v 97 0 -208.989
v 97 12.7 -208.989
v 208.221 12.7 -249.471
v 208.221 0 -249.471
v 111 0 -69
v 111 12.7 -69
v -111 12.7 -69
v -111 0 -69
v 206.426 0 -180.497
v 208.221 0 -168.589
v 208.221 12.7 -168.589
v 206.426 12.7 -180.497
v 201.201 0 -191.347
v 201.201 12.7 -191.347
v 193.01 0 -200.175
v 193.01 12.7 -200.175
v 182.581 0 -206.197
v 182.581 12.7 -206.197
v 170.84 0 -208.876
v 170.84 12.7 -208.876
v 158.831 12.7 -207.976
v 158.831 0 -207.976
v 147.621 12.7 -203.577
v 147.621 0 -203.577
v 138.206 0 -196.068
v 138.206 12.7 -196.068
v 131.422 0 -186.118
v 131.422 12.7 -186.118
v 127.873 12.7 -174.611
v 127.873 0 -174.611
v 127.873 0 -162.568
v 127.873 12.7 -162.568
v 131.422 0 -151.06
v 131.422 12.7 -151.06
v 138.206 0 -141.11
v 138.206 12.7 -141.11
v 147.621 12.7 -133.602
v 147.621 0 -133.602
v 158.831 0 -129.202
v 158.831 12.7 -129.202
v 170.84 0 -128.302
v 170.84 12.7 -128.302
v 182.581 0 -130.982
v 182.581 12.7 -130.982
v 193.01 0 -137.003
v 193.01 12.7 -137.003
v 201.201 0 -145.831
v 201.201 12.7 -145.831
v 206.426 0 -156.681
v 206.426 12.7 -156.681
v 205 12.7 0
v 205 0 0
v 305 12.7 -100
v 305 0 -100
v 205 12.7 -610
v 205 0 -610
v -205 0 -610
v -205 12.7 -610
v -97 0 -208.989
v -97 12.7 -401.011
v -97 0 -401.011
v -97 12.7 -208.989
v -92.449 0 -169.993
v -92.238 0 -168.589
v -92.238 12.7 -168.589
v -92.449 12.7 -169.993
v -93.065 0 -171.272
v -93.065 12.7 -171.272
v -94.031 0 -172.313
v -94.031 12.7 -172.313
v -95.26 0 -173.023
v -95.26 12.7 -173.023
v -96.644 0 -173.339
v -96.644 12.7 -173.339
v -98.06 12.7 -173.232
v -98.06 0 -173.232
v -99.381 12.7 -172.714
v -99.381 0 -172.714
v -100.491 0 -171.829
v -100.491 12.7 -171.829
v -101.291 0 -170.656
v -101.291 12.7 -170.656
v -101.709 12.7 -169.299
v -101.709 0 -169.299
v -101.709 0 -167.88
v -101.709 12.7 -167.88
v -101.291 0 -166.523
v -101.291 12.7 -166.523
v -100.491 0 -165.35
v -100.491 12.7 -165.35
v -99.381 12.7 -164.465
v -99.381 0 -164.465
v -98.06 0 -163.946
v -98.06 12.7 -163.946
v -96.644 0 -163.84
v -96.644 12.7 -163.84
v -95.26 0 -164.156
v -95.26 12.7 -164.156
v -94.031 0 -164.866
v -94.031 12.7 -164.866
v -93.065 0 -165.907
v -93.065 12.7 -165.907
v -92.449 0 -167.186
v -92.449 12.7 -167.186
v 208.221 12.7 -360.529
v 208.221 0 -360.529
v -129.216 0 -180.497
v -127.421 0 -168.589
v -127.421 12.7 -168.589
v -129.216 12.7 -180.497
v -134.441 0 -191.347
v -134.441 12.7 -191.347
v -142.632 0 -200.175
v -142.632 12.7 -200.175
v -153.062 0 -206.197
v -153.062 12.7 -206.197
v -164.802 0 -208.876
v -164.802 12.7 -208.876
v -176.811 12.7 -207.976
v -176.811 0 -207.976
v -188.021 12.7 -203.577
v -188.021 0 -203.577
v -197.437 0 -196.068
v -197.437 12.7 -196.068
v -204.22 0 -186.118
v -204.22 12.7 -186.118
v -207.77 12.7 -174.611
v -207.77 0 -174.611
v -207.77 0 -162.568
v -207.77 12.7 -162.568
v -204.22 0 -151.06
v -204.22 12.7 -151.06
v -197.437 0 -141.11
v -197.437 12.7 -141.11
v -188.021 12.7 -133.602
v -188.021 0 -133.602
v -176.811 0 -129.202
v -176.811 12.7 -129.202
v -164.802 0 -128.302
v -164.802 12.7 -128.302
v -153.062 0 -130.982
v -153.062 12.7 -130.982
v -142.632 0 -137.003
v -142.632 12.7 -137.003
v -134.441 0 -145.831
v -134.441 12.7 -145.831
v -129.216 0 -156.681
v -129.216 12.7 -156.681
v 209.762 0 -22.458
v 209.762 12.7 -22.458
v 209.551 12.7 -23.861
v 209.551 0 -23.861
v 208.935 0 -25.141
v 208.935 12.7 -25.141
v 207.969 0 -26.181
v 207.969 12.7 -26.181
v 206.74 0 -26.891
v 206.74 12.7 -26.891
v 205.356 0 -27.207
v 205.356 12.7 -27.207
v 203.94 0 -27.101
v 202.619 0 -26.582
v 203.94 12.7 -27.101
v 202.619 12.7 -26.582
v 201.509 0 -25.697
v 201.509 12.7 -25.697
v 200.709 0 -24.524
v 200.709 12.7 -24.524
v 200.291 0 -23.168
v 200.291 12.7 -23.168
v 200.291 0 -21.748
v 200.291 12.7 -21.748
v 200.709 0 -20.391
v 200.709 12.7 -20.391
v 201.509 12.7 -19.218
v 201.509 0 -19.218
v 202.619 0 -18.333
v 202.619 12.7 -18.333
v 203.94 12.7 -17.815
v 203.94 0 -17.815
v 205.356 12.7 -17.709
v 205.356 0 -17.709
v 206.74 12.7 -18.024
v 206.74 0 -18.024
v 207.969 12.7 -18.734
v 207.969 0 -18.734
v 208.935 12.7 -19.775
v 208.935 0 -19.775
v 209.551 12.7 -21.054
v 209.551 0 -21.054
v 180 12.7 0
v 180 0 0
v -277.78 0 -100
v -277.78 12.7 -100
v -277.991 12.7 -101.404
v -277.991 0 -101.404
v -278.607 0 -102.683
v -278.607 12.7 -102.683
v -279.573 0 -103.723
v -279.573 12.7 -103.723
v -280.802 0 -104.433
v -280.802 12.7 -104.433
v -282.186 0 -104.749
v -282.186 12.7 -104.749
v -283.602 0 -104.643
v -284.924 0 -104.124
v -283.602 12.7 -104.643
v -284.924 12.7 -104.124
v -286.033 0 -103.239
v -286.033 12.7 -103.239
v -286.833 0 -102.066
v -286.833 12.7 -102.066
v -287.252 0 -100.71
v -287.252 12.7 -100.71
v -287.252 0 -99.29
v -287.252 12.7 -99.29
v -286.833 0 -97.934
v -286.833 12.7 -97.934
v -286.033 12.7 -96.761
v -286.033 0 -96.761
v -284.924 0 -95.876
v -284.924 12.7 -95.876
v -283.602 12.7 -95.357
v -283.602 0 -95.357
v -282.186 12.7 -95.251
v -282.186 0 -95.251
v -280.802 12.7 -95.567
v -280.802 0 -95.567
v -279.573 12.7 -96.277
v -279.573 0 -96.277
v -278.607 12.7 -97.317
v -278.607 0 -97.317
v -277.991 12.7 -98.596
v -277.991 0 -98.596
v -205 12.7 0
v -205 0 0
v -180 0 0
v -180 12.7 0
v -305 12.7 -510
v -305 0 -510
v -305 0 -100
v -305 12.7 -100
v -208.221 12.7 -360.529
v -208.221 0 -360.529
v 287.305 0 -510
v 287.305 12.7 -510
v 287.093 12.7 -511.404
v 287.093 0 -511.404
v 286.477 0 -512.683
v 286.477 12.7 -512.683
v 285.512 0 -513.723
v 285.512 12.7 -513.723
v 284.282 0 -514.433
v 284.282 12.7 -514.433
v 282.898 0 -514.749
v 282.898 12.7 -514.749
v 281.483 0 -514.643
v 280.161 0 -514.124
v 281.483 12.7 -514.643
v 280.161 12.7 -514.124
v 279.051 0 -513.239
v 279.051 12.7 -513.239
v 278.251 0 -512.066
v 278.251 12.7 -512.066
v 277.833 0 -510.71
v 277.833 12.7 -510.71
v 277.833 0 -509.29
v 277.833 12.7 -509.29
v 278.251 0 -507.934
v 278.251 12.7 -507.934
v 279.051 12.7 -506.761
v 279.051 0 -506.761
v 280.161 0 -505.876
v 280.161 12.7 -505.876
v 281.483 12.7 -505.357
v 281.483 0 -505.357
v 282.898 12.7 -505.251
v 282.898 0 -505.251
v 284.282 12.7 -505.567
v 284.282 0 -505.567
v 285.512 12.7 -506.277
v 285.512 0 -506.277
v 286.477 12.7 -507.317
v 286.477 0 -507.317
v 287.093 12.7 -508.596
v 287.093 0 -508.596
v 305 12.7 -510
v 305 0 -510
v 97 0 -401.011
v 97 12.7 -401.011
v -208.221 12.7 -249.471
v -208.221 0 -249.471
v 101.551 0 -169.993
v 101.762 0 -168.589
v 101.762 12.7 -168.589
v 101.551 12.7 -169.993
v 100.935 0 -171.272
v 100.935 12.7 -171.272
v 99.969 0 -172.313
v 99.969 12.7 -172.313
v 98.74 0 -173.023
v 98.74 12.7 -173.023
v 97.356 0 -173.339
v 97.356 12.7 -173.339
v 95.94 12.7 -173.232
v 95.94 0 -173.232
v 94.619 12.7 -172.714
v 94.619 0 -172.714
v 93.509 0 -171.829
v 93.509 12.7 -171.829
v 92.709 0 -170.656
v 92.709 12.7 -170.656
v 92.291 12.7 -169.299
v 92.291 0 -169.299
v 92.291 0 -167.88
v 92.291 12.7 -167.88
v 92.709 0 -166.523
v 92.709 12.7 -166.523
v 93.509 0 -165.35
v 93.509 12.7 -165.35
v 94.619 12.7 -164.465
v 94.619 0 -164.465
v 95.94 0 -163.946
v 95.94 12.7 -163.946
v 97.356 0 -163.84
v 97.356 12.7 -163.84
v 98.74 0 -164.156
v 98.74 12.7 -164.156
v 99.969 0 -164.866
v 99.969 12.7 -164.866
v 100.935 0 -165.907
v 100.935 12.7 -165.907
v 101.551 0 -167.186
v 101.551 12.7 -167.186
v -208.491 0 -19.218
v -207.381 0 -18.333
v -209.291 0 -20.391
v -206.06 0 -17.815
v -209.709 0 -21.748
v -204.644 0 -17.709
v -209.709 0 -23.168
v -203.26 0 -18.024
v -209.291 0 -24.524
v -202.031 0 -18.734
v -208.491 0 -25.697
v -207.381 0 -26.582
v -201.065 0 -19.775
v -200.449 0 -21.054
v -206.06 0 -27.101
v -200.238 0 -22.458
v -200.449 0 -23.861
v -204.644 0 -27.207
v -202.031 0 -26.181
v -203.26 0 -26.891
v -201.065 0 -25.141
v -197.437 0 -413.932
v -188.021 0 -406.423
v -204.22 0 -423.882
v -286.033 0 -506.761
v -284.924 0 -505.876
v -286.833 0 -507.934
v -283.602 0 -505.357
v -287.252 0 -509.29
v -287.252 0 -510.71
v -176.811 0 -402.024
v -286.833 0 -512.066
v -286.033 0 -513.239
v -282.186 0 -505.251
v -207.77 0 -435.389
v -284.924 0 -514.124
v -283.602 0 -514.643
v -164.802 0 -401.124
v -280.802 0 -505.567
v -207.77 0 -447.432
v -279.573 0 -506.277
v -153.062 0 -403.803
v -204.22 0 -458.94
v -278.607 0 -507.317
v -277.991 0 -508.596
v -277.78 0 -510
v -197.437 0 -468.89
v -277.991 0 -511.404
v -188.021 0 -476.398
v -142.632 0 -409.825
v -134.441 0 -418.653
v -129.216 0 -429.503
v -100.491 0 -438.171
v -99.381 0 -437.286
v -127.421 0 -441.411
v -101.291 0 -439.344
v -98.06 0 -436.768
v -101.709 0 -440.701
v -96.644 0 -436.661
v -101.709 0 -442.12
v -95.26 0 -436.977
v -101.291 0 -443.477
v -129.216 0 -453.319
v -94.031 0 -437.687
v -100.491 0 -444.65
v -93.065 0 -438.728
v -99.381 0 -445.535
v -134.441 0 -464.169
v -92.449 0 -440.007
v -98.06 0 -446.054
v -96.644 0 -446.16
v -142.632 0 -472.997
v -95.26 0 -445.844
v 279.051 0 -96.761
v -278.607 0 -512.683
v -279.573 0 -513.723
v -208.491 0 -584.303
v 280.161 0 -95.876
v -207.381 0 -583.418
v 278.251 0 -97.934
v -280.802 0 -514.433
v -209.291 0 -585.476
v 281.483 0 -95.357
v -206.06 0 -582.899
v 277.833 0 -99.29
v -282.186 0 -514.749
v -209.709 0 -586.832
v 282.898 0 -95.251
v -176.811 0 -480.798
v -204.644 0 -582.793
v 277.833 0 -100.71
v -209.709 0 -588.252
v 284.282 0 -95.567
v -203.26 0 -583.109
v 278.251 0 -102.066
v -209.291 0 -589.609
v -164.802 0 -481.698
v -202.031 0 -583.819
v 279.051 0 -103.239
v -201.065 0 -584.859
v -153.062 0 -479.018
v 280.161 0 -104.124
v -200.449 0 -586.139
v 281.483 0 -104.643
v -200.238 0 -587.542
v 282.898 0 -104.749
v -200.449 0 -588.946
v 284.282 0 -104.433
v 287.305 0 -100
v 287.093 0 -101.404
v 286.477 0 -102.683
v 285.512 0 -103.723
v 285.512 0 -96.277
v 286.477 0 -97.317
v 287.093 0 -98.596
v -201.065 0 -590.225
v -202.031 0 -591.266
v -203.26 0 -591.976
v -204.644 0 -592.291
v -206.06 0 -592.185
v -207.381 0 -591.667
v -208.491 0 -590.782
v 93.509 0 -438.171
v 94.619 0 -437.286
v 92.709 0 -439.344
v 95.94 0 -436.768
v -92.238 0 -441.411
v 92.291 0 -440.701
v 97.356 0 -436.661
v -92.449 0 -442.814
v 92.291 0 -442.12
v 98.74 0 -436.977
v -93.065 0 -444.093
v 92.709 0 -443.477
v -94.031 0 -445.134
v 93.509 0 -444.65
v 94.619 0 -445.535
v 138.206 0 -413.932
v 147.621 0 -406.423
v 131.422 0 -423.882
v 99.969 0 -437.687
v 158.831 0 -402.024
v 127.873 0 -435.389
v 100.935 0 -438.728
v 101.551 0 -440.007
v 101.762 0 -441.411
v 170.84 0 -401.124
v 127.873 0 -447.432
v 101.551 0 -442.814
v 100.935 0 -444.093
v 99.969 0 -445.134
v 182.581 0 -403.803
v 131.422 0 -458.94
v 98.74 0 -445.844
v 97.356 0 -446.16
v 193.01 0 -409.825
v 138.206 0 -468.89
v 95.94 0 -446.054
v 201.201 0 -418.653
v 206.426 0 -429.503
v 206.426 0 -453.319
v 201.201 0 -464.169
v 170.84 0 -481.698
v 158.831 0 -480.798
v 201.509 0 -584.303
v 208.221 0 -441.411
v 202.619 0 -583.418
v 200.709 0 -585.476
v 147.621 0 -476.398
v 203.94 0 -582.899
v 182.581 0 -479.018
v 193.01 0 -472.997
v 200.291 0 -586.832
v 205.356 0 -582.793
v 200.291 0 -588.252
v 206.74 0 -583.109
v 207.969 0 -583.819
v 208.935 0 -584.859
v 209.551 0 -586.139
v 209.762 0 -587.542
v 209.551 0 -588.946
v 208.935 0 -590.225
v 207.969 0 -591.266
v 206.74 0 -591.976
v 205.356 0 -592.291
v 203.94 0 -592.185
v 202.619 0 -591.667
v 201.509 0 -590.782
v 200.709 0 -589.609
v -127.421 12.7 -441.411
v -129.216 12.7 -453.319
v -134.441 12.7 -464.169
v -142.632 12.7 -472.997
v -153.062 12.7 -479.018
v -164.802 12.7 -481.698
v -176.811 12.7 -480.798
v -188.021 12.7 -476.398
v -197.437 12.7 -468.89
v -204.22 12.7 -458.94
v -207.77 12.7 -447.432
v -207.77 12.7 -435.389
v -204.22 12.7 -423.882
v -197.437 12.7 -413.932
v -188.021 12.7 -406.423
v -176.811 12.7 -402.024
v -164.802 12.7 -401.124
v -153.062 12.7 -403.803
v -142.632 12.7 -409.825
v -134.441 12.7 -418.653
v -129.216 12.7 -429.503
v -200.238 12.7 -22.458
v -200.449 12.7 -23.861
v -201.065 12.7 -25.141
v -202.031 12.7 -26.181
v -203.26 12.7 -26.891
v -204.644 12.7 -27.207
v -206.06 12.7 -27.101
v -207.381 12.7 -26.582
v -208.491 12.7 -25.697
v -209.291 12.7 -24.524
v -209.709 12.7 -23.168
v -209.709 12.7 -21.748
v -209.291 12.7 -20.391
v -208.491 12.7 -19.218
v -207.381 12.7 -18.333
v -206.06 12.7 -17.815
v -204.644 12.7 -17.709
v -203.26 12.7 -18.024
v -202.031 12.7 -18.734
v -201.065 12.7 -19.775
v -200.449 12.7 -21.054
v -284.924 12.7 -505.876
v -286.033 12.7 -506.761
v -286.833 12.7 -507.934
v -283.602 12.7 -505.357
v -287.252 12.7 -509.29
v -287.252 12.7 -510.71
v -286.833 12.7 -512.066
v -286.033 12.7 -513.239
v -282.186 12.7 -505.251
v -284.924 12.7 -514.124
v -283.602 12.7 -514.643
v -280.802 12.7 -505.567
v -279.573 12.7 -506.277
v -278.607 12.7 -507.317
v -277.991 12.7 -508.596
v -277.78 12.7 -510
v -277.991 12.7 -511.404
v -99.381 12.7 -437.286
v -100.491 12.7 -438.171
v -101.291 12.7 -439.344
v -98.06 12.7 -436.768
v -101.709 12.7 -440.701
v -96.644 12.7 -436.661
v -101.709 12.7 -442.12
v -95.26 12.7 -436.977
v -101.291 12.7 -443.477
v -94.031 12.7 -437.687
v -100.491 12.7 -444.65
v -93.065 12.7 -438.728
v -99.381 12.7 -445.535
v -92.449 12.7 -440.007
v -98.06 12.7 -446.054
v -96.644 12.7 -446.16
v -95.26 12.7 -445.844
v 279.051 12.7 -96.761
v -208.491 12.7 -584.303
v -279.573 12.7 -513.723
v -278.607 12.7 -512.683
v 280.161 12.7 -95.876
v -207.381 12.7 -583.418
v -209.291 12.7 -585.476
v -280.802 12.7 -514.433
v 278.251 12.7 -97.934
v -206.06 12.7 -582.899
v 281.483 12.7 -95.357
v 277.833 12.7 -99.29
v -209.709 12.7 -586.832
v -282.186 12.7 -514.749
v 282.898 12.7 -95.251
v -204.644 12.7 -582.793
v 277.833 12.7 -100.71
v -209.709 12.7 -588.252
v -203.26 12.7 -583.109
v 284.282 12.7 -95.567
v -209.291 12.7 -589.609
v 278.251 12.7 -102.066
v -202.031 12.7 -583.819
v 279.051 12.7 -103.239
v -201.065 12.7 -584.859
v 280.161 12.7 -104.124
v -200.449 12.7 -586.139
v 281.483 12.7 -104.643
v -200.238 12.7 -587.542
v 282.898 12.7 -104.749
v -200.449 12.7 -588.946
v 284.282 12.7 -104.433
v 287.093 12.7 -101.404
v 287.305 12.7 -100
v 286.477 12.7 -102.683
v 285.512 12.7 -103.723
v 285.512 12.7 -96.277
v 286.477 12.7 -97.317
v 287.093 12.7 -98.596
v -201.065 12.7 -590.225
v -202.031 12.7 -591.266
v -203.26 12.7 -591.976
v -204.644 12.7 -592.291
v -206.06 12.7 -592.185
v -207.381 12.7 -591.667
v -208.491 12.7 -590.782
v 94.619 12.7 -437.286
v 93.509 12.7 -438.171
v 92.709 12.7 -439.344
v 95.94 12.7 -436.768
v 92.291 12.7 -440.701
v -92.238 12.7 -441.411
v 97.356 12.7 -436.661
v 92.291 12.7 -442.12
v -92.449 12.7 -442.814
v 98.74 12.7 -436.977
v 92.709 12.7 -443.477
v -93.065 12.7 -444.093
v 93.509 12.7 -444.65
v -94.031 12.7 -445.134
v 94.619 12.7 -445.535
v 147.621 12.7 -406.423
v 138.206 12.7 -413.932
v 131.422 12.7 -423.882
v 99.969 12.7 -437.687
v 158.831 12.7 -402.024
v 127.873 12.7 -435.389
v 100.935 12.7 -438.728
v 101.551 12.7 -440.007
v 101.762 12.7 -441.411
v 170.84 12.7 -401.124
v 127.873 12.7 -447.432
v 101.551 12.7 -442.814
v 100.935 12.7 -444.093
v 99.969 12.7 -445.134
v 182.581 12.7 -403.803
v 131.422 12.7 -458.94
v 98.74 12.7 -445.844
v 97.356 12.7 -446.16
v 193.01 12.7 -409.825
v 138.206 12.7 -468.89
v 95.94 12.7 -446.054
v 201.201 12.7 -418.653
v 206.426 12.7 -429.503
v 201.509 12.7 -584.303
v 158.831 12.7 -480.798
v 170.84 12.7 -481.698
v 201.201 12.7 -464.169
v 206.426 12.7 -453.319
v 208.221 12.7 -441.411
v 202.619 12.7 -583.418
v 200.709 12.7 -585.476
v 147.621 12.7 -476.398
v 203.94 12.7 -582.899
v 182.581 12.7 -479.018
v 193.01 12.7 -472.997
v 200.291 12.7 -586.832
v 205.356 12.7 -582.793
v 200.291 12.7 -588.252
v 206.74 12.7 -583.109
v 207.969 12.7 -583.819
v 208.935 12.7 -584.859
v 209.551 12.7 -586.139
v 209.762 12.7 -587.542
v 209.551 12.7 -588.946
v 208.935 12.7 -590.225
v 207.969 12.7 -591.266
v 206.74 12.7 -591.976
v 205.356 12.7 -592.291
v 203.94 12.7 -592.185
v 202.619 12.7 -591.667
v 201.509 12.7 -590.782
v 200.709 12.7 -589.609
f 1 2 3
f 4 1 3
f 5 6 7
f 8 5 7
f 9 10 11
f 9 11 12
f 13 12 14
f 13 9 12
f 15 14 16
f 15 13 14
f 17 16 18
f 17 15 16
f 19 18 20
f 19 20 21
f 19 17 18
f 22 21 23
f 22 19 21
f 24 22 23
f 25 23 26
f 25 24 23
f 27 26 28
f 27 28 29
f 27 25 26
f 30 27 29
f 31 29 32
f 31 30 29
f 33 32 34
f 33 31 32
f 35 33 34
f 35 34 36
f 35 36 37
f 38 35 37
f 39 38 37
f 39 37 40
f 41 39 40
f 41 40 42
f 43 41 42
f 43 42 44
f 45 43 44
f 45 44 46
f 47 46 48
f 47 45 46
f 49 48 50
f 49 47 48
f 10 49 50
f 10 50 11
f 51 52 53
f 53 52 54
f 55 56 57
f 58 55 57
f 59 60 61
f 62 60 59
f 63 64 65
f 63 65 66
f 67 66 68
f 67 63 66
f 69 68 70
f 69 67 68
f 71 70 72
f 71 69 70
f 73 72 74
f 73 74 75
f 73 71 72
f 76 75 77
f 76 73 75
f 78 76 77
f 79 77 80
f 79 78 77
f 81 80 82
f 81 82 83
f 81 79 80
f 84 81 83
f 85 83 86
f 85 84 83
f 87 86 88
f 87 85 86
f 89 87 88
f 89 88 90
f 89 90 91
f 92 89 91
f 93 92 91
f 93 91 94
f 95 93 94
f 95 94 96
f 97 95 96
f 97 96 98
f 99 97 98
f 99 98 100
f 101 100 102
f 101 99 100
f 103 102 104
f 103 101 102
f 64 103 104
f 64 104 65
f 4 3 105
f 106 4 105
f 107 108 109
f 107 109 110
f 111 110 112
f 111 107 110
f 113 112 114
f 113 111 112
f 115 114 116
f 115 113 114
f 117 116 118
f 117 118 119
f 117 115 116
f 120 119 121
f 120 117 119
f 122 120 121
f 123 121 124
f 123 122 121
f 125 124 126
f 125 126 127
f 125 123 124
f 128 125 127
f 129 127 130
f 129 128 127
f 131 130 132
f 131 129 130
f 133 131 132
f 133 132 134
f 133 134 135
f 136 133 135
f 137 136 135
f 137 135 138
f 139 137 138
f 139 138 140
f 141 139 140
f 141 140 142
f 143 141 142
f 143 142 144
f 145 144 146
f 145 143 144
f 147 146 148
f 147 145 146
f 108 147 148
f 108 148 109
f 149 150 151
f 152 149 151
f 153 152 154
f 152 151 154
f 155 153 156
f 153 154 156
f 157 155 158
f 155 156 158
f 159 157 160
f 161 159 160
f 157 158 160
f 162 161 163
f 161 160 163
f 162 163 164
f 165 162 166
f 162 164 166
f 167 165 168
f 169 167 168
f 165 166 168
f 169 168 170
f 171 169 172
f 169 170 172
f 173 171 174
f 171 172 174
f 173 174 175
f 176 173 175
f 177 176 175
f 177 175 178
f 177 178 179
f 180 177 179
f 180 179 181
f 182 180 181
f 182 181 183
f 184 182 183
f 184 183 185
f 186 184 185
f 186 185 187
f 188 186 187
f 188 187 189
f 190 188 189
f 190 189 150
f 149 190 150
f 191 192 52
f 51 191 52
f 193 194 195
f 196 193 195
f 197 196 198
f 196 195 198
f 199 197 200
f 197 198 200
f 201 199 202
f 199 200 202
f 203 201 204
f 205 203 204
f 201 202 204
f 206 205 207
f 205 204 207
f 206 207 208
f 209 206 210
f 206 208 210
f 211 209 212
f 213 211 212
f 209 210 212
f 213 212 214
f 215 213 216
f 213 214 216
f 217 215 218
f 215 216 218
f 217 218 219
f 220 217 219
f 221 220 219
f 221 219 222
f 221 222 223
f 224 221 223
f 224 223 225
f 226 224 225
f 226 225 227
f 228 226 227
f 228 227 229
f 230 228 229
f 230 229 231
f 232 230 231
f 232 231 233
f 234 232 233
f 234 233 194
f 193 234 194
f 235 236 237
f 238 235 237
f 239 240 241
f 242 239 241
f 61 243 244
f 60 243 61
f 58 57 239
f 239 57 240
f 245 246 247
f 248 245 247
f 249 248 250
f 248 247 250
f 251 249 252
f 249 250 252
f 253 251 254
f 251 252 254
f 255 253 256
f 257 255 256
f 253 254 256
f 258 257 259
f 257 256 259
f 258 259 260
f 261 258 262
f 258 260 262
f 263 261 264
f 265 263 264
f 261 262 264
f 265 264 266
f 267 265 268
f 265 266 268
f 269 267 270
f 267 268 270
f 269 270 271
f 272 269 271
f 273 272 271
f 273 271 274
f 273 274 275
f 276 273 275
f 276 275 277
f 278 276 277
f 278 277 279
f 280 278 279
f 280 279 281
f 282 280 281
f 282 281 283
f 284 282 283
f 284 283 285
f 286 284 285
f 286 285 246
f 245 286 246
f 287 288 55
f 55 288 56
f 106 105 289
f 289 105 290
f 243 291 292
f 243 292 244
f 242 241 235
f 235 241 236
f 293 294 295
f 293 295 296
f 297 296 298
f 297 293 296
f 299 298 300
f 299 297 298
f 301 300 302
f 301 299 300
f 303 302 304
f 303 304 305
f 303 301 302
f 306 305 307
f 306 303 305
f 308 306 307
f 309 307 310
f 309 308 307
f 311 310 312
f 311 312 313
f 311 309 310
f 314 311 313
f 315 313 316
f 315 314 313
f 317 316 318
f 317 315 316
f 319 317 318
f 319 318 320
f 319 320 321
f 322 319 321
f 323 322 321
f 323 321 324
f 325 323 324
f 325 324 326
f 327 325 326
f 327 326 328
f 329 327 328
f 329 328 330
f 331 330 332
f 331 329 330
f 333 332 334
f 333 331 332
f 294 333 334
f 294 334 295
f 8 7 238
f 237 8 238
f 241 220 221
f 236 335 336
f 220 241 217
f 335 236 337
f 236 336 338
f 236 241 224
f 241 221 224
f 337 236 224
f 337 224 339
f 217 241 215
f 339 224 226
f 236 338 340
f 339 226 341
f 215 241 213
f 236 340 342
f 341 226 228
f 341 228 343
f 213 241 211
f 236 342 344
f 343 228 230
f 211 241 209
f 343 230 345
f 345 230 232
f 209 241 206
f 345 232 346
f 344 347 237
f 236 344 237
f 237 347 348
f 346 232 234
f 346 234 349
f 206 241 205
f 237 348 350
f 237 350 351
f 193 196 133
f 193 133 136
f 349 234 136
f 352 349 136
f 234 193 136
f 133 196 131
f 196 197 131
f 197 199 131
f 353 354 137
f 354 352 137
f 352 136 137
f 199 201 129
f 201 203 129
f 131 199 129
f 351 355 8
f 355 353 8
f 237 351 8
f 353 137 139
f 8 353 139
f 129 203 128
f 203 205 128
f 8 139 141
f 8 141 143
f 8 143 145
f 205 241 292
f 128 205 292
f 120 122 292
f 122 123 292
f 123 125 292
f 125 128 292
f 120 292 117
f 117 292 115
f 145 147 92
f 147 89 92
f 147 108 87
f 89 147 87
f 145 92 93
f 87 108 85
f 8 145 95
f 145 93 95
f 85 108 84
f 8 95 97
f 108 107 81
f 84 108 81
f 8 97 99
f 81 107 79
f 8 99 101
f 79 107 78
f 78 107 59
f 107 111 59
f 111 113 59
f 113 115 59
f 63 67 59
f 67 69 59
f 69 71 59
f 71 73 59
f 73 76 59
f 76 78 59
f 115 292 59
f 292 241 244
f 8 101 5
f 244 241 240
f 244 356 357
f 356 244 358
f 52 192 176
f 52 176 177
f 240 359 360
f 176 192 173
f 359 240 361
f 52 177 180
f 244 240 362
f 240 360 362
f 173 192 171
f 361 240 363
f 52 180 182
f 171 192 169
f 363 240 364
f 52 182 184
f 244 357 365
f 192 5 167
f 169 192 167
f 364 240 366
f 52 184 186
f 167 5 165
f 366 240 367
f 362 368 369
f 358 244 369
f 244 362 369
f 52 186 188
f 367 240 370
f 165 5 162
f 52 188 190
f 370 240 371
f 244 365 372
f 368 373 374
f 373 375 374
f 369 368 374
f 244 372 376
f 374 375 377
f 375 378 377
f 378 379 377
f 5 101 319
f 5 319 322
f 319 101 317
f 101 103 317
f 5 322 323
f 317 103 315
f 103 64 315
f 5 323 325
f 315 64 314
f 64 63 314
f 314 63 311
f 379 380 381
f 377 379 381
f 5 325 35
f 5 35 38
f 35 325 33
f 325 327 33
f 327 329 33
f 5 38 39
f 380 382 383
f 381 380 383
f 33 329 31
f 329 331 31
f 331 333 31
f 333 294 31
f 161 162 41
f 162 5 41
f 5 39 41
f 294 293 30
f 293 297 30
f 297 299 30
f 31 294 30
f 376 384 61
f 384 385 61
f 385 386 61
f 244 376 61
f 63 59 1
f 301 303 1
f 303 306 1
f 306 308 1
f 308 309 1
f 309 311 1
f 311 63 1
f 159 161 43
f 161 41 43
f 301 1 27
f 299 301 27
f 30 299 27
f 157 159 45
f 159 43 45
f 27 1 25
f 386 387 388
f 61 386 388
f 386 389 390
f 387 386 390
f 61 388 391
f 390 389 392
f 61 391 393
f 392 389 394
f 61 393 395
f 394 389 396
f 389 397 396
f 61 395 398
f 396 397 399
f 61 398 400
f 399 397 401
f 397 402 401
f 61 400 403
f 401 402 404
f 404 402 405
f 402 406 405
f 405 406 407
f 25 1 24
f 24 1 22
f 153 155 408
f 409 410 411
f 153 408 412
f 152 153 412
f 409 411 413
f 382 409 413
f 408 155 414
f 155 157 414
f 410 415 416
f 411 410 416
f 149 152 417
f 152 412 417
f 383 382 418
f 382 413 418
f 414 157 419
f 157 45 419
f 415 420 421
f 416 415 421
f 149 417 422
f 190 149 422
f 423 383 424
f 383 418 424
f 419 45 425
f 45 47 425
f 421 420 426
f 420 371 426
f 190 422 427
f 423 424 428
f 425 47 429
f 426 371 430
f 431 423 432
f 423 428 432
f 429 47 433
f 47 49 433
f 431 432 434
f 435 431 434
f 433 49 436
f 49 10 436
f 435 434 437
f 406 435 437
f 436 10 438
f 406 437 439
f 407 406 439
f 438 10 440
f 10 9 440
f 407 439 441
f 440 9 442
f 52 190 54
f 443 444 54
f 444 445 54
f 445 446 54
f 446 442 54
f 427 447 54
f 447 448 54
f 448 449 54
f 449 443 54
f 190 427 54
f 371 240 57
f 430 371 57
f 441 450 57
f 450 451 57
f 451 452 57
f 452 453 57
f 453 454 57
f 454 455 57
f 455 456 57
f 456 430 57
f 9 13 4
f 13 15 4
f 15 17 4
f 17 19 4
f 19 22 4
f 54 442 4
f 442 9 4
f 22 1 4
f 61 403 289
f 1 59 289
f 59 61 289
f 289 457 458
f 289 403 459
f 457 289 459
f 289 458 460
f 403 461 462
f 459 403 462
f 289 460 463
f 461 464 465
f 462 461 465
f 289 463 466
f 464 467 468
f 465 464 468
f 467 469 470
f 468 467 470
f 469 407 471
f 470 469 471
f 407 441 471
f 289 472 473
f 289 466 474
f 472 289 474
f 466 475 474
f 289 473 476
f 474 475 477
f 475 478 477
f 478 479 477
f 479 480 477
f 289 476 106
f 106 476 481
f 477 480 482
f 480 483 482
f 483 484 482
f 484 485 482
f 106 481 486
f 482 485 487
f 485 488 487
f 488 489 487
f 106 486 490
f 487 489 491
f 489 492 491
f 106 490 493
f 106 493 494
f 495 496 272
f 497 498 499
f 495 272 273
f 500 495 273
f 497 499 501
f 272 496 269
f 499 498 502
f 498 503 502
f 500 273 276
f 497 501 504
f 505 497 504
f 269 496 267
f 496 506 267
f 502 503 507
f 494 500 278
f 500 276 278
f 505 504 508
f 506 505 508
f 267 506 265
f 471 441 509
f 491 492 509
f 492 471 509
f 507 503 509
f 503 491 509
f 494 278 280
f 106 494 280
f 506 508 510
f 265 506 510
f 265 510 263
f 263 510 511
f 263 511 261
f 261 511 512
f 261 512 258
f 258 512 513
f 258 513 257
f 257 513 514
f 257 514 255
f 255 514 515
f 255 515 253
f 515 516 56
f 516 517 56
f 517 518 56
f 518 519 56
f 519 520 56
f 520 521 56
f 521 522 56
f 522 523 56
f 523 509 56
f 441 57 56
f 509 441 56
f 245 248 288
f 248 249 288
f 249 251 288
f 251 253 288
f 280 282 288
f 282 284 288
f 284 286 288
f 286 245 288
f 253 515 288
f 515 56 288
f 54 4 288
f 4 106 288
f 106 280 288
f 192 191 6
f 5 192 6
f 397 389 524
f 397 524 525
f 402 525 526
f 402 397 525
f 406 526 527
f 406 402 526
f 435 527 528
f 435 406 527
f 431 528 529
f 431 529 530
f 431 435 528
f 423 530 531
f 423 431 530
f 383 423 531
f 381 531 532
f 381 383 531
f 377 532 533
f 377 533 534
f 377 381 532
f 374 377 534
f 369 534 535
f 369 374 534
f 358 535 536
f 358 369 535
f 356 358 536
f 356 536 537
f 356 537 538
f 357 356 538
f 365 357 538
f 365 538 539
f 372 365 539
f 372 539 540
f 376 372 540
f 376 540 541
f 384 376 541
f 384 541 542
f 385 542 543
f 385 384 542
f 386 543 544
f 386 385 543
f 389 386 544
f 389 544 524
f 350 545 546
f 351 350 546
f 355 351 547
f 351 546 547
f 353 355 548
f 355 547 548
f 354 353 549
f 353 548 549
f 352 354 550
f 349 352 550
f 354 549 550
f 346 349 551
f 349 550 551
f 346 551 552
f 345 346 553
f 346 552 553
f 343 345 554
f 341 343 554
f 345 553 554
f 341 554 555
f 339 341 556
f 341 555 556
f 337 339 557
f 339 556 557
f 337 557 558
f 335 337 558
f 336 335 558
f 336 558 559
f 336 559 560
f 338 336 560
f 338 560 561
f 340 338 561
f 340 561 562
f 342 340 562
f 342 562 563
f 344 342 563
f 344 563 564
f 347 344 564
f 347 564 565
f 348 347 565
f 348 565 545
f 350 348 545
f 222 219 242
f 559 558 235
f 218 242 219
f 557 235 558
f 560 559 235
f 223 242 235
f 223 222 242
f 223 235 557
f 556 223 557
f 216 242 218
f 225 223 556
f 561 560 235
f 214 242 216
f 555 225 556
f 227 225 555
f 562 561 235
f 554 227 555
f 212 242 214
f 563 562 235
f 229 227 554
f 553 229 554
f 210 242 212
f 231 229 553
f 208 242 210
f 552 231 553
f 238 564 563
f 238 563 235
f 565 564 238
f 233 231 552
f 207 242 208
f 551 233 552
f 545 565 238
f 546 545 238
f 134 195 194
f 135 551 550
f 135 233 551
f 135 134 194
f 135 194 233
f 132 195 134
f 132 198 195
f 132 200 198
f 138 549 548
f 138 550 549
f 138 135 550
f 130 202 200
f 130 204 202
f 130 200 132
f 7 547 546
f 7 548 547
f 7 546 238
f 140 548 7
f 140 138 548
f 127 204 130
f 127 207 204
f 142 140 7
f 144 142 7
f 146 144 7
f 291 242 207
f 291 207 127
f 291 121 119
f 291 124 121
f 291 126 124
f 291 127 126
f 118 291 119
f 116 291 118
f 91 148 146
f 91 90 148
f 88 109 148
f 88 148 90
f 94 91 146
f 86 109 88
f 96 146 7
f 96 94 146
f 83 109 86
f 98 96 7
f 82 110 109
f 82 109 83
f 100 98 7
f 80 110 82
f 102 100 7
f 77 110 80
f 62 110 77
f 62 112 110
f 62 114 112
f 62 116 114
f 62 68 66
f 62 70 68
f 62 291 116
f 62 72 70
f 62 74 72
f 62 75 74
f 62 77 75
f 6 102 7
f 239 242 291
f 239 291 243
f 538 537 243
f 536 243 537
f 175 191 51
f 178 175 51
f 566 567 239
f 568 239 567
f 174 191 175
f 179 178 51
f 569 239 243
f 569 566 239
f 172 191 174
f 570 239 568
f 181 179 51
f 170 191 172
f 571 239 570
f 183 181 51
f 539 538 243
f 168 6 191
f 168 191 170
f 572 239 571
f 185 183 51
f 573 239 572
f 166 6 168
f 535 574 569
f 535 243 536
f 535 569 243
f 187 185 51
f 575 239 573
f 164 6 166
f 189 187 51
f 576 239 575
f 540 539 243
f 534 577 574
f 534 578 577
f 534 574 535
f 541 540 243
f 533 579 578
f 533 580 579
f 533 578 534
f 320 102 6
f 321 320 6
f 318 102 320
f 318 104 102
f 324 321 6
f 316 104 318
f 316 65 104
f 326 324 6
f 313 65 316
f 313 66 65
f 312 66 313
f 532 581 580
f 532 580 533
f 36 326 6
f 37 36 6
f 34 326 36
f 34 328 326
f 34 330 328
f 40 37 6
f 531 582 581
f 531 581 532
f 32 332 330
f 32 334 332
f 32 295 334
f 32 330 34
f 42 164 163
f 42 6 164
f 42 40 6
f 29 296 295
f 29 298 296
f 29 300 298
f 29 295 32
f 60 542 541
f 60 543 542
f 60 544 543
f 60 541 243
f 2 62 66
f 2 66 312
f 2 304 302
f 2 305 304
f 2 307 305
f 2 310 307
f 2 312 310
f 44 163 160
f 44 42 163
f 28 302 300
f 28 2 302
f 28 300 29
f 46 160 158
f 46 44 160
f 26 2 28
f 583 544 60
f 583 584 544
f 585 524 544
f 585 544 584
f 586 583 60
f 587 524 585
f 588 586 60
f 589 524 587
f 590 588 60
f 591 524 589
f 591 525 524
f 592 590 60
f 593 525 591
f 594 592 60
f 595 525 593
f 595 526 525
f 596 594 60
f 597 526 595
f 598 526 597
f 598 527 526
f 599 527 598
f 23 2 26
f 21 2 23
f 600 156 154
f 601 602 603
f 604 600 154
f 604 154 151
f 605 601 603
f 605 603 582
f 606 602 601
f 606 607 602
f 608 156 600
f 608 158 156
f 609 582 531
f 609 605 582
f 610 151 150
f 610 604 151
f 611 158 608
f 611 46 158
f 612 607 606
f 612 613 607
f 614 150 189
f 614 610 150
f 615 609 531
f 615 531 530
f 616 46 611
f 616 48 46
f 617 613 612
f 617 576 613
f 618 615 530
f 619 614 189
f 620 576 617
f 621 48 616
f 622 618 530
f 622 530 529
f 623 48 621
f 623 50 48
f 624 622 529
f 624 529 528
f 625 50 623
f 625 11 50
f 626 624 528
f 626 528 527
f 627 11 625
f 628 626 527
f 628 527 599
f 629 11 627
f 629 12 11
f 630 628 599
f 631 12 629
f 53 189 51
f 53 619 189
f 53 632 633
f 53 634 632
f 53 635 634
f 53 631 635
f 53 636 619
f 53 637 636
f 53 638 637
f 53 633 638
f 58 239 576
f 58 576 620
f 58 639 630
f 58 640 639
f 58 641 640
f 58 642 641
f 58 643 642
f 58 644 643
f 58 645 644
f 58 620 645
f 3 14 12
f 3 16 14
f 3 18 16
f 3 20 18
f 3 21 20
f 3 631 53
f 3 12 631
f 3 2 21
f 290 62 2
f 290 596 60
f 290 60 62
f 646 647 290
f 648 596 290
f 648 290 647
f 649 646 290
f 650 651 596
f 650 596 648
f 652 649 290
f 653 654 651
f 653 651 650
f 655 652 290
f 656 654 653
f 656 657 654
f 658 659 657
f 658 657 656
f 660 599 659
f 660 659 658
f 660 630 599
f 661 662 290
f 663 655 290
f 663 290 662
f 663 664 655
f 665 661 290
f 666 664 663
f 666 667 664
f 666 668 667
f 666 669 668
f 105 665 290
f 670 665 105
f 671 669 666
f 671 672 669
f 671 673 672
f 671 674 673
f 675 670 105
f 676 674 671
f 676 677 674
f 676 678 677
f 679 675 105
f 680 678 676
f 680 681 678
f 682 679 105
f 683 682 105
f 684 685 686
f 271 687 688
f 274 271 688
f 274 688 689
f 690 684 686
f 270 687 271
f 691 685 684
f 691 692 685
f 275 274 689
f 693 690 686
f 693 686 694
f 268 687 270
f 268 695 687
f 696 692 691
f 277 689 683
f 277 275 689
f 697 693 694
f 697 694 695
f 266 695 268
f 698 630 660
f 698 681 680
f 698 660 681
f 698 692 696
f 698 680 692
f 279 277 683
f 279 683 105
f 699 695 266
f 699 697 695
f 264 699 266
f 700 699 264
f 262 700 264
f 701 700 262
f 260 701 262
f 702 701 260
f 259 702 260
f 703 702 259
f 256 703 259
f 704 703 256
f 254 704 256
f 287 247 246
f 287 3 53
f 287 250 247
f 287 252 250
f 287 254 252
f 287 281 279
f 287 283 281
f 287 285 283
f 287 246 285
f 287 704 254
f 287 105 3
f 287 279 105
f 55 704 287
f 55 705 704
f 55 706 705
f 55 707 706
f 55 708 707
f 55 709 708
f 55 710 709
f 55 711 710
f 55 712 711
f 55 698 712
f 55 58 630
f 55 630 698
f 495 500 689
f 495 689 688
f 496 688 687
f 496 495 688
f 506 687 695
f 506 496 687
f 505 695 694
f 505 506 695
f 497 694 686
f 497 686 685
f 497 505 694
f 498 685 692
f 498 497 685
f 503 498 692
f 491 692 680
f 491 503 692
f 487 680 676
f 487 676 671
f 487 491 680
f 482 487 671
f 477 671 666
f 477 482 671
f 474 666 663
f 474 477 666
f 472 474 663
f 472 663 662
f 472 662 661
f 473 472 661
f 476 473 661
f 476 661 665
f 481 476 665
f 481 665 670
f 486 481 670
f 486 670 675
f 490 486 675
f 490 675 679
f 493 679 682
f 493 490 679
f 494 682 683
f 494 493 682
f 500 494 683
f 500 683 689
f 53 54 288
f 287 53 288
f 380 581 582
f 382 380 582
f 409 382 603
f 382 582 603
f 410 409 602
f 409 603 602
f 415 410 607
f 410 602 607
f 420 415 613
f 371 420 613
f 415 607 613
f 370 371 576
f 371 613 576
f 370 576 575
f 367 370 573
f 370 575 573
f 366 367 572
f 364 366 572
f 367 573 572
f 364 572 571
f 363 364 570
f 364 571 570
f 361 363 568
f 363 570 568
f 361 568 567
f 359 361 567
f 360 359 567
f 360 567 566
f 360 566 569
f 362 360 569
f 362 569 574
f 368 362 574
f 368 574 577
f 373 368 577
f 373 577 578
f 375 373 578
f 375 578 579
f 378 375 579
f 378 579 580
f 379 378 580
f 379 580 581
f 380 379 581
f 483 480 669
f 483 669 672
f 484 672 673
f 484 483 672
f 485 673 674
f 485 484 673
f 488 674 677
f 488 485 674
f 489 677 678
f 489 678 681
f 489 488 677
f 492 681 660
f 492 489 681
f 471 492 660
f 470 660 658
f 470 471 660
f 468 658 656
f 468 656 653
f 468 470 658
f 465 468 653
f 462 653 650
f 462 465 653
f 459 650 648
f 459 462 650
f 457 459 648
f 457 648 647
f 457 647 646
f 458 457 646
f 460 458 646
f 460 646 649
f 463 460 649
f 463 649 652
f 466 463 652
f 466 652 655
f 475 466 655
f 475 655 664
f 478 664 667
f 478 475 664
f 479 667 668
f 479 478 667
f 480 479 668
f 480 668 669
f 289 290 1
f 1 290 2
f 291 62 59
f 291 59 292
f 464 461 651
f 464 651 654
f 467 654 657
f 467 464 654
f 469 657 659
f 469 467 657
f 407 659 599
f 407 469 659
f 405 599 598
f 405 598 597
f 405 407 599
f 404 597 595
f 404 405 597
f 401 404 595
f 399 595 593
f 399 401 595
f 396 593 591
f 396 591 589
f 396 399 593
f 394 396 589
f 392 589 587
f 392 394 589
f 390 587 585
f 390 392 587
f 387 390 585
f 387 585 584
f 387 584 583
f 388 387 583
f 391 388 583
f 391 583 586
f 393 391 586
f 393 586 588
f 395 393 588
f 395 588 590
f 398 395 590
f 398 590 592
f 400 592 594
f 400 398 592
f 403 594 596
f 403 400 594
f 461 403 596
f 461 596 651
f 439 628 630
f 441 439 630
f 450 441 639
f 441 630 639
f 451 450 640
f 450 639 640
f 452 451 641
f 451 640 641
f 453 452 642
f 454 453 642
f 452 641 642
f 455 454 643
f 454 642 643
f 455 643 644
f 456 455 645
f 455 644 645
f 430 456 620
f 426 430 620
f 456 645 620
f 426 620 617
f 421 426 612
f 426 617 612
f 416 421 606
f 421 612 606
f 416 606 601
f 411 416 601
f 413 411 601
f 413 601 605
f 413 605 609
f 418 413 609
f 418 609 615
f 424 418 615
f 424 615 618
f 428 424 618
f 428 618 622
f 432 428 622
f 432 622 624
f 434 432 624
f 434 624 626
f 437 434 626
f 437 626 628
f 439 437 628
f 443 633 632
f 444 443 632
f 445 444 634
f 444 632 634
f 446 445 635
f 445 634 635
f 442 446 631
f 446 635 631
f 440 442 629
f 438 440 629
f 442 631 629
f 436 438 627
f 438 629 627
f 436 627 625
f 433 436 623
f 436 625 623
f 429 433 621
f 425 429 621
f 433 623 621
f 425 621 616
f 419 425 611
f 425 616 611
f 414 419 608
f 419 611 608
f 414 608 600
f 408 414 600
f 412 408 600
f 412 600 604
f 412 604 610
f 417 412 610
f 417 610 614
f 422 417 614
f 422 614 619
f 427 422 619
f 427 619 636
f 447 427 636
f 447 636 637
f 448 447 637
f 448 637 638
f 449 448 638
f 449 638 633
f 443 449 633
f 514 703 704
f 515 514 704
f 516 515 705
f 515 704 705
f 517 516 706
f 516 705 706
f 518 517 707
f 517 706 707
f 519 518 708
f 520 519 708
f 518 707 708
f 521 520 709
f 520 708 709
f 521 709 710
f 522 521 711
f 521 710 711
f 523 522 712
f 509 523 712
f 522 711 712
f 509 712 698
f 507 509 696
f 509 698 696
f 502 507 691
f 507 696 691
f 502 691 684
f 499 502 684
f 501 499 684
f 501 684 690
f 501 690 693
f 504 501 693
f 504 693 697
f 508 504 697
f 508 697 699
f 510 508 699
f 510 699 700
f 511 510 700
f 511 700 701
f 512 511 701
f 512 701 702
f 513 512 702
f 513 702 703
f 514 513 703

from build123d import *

# Parameters (mm, degrees)
SKETCH1_R           = 40.4
SKETCH1_R_2         = 4.7625
BOSS_EXTRUDE1_DEPTH = 12.7
CUT_EXTRUDE1_DEPTH  = 5000
SKETCH3_R           = 4.7625
CUT_EXTRUDE2_DEPTH  = 5000
CUT_EXTRUDE3_DEPTH  = 20


with BuildPart() as part:
    # Sketch1 → Boss-Extrude1 (new body)
    with BuildSketch(Plane(origin=(0, 0, 0), x_dir=(1, 0, 0), z_dir=(0, 1, 0))):
        Polygon((205, 0), (305, 100), (305, 510), (205, 610), (-205, 610), (-305, 510), (-305, 100), (-205, 0), align=None)
        with Locations((-167.82128445, 168.589357775)):
            Circle(SKETCH1_R, mode=Mode.SUBTRACT)
        with Locations((-97, 168.589357775)):
            Circle(SKETCH1_R_2, mode=Mode.SUBTRACT)
        with Locations((97, 168.589357775)):
            Circle(SKETCH1_R_2, mode=Mode.SUBTRACT)
        with Locations((167.82128445, 168.589357775)):
            Circle(SKETCH1_R, mode=Mode.SUBTRACT)
        with Locations((-167.82128445, 441.410642225)):
            Circle(SKETCH1_R, mode=Mode.SUBTRACT)
        with Locations((-97, 441.410642225)):
            Circle(SKETCH1_R_2, mode=Mode.SUBTRACT)
        with Locations((97, 441.410642225)):
            Circle(SKETCH1_R_2, mode=Mode.SUBTRACT)
        with Locations((167.82128445, 441.410642225)):
            Circle(SKETCH1_R, mode=Mode.SUBTRACT)
    extrude(amount=BOSS_EXTRUDE1_DEPTH)

    # Sketch2 → Cut-Extrude1 (cut)
    with BuildSketch(Plane(origin=(0, 12.7, 0), x_dir=(1, 0, 0), z_dir=(0, 1, 0))):
        Polygon((-111, 69), (-180, 0), (180, 0), (111, 69), align=None)
    extrude(amount=-CUT_EXTRUDE1_DEPTH, mode=Mode.SUBTRACT)

    # Sketch3 → Cut-Extrude2 (cut)
    with BuildSketch(Plane(origin=(0, 12.7, 0), x_dir=(1, 0, 0), z_dir=(0, 1, 0))):
        with Locations((-205, 22.45771137)):
            Circle(SKETCH3_R)
        with Locations((205, 22.45771137)):
            Circle(SKETCH3_R)
        with Locations((-282.54228863, 100)):
            Circle(SKETCH3_R)
        with Locations((282.54228863, 100)):
            Circle(SKETCH3_R)
        with Locations((282.54228863, 510)):
            Circle(SKETCH3_R)
        with Locations((205, 587.54228863)):
            Circle(SKETCH3_R)
        with Locations((-205, 587.54228863)):
            Circle(SKETCH3_R)
        with Locations((-282.54228863, 510)):
            Circle(SKETCH3_R)
    extrude(amount=-CUT_EXTRUDE2_DEPTH, mode=Mode.SUBTRACT)

    # Sketch4 → Cut-Extrude3 (cut)
    with BuildSketch(Plane(origin=(0, 12.7, 0), x_dir=(1, 0, 0), z_dir=(0, 1, 0))):
        Polygon((-208.22128445, 360.529405268), (-97, 401.010642225), (-97, 208.989357775), (-208.22128445, 249.470594732), align=None)
        Polygon((208.22128445, 249.470594732), (208.22128445, 360.529405268), (97, 401.010642225), (97, 208.989357775), align=None)
    extrude(amount=-CUT_EXTRUDE3_DEPTH, mode=Mode.SUBTRACT)


solid = part.part
